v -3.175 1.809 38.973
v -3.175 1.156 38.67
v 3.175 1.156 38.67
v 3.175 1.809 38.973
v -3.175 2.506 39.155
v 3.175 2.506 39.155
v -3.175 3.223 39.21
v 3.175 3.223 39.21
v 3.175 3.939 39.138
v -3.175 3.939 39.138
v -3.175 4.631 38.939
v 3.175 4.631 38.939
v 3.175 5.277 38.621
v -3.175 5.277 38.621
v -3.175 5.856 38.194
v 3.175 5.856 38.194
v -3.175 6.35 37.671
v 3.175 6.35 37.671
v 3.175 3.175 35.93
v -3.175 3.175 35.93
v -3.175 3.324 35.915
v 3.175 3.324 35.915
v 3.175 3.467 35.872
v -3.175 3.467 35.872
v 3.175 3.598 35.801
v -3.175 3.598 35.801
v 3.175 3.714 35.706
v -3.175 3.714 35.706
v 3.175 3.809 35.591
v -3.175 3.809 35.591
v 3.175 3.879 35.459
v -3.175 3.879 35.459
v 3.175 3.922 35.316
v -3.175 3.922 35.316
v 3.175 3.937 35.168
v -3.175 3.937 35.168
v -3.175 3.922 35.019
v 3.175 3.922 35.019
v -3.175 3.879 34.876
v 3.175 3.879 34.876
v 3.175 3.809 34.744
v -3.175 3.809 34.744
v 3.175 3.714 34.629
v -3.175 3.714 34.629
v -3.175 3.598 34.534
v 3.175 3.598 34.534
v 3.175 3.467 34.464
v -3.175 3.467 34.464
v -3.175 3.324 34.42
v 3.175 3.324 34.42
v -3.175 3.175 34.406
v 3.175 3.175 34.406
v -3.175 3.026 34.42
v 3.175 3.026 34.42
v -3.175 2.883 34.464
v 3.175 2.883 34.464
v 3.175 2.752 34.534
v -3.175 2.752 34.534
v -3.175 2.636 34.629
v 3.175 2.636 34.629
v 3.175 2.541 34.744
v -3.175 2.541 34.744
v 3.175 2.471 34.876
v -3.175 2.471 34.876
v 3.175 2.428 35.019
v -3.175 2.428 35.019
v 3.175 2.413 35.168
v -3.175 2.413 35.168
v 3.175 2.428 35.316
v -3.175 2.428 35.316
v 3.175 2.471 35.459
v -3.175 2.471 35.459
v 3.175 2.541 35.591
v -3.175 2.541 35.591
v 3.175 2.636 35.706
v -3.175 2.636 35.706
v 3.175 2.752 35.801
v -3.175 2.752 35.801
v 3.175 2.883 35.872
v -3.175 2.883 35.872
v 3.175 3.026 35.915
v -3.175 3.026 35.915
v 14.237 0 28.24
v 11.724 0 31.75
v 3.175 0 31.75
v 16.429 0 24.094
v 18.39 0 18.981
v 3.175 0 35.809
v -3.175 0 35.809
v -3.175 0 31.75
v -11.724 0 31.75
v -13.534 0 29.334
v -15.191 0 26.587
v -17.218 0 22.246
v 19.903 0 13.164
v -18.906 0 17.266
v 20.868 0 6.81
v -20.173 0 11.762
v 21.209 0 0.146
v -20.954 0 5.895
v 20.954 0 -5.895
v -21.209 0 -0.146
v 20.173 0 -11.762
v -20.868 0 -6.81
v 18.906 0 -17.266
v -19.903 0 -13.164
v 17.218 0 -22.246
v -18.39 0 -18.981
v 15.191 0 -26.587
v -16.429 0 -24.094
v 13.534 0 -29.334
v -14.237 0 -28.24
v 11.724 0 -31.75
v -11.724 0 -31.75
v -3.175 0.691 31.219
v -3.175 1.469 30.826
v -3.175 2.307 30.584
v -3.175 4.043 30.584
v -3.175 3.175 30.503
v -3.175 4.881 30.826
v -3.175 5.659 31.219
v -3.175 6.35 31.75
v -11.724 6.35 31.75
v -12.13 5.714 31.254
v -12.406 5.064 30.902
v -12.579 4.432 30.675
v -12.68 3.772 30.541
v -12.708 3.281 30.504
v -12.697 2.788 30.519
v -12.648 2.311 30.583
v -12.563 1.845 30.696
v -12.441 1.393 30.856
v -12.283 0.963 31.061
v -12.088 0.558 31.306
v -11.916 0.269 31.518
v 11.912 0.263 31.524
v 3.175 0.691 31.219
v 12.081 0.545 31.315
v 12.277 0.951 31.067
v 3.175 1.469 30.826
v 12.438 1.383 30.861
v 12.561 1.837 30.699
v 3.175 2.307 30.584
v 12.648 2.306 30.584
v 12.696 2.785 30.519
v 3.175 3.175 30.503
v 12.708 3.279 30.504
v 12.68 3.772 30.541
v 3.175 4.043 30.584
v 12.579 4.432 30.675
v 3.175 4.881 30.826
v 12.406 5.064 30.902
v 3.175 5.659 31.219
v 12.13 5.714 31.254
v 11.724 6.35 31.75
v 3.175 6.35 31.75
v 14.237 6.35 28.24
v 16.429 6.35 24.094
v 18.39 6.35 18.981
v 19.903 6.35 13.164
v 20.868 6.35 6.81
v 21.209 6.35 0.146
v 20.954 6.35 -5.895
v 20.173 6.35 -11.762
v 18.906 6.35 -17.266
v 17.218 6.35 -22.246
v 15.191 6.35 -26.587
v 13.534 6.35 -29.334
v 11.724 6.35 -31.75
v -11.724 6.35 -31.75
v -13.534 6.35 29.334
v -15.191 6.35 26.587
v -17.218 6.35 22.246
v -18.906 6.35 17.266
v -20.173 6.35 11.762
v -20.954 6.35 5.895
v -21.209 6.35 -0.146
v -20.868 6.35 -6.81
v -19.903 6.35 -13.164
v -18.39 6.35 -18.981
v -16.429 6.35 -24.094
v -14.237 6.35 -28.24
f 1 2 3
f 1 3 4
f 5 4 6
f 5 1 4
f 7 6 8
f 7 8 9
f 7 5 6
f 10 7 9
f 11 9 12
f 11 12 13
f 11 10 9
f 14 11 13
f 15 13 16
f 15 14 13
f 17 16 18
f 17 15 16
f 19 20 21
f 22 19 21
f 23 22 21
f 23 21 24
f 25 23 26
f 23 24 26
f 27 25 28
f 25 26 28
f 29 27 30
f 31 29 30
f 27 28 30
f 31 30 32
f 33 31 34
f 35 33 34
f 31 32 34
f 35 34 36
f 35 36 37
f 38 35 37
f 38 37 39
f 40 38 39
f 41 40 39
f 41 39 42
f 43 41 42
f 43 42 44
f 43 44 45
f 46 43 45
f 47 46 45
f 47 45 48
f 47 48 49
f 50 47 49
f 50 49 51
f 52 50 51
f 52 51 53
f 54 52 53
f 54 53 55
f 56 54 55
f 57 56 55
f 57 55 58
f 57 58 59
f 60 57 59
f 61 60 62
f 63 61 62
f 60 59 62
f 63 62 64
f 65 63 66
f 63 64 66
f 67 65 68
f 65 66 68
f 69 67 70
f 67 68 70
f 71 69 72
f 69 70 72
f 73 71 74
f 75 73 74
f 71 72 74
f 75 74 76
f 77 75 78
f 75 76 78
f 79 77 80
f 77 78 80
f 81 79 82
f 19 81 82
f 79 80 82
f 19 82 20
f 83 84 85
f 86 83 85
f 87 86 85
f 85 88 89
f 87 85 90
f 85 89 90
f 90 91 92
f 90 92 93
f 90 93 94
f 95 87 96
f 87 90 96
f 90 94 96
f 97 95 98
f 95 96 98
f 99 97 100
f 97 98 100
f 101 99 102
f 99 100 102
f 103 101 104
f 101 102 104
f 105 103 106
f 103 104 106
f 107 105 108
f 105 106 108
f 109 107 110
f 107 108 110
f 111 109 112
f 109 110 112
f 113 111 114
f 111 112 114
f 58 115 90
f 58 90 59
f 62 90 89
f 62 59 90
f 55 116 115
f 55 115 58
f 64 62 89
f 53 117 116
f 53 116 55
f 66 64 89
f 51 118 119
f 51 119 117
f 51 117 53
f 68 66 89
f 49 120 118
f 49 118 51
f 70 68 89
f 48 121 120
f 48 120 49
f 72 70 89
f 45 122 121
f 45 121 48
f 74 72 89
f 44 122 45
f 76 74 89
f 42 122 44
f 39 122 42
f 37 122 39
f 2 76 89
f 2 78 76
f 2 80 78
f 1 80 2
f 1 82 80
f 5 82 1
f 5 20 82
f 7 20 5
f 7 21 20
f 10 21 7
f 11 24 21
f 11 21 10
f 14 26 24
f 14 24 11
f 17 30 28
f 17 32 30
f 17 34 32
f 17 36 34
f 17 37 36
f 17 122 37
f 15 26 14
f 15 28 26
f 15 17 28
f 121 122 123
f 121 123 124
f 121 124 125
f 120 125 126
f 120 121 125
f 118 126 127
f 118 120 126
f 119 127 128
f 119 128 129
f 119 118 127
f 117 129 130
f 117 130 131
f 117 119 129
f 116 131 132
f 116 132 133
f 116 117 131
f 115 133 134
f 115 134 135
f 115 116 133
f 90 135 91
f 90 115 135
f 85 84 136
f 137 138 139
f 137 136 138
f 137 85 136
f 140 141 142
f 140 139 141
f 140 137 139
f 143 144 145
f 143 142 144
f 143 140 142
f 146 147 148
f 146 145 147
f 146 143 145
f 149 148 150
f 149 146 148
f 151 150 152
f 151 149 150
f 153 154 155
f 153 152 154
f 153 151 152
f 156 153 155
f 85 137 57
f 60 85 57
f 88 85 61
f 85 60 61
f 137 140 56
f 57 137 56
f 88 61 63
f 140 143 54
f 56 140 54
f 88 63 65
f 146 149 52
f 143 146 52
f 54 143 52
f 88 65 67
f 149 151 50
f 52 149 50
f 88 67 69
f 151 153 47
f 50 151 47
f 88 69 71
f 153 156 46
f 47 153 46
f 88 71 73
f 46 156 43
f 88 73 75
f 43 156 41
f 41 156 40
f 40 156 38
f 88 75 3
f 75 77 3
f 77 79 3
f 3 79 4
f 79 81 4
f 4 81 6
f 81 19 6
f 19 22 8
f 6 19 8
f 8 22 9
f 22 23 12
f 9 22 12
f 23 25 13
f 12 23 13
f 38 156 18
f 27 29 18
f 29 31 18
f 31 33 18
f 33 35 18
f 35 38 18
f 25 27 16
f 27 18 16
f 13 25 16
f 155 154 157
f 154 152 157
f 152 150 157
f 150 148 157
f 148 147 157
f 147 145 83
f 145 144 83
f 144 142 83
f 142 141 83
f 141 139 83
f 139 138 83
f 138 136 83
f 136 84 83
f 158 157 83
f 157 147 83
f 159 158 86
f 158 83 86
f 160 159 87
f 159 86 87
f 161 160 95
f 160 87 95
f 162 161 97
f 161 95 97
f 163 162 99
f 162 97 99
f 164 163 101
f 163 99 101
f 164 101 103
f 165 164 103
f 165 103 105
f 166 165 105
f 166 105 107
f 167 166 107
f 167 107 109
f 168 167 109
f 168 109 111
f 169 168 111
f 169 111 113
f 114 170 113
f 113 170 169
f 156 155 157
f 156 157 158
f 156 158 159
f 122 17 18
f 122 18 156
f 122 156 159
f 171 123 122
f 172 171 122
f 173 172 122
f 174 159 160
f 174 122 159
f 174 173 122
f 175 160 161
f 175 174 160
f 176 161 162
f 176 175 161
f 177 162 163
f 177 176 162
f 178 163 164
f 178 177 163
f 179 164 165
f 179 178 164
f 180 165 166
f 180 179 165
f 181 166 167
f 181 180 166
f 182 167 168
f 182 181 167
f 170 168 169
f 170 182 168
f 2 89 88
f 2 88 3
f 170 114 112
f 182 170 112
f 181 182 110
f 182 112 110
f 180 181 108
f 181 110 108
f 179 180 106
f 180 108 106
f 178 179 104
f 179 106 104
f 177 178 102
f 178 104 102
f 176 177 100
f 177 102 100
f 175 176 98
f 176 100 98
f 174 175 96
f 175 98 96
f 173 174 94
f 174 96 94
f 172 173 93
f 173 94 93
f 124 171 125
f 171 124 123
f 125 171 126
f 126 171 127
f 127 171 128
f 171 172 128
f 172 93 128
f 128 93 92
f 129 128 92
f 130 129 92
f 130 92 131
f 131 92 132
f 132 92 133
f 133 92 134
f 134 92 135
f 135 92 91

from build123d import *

# Parameters (mm, degrees)
SKETCH1_RX               = 38.1
SKETCH1_RY               = 21.209
BOSS_EXTRUDE1_DEPTH      = 6.35
CUT_EXTRUDE6_DEPTH       = 45.065339906
SKETCH35_W               = 18.034
SKETCH35_H               = 6.35
CUT_EXTRUDE17_DEPTH      = 45.065339906
SKETCH36_R               = 0.762
CUT_EXTRUDE18_DEPTH      = 46.678353405
SKETCH37_R               = 4.664778091
CUT_EXTRUDE19_DEPTH      = 46.678353405
SKETCH38_R               = 4.664778091
CUT_EXTRUDE20_DEPTH      = 46.678353405
CUT_EXTRUDE21_DEPTH      = 46.678353405
CUT_EXTRUDE21_DEPTH_BACK = 46.678353405
SKETCH39_W               = 2.364149351
SKETCH39_H               = 6.35
BOSS_EXTRUDE2_DEPTH      = 6.35
CUT_EXTRUDE22_DEPTH      = 46.029039702
CUT_EXTRUDE22_DEPTH_BACK = 46.029039702


with BuildPart() as part:
    # Sketch1 → Boss-Extrude1 (new body)
    with BuildSketch(Plane(origin=(0, 0, 0), x_dir=(1, 0, 0), z_dir=(0, 1, 0))):
        with Locations(Location((0, 0), (0, 0, 90))):
            Ellipse(SKETCH1_RX, SKETCH1_RY)
    extrude(amount=BOSS_EXTRUDE1_DEPTH)

    # Sketch7 → Cut-Extrude6 (cut, through all)
    with BuildSketch(Plane(origin=(0, 6.35, 0), x_dir=(1, 0, 0), z_dir=(0, 1, 0))):
        with BuildLine():
            Line((-11.723715863, 31.75), (11.723715863, 31.75))
            add(Edge.make_bspline(
                [(11.723715863, 31.75), (0, 45.72), (-11.723715863, 31.75)],
                knots=[5.697499764, 5.697499764, 5.697499764, 6.868870851, 6.868870851, 6.868870851], degree=2, weights=[1, 0.833333333, 1]))
        make_face()
    extrude(amount=-CUT_EXTRUDE6_DEPTH, mode=Mode.SUBTRACT)

    # Sketch35 → Cut-Extrude17 (cut, through all)
    with BuildSketch(Plane(origin=(0, 6.35, 0), x_dir=(1, 0, 0), z_dir=(0, 1, 0))):
        with Locations((12.192, -34.925)):
            Rectangle(SKETCH35_W, SKETCH35_H)
        with Locations((-12.192, -34.925)):
            Rectangle(SKETCH35_W, SKETCH35_H)
    extrude(amount=-CUT_EXTRUDE17_DEPTH, mode=Mode.SUBTRACT)

    # Sketch36 → Cut-Extrude18 (cut, through all)
    with BuildSketch(Plane.ZY.offset(3.175)):
        with Locations((35.167532682, 3.175)):
            Circle(SKETCH36_R)
    extrude(amount=-CUT_EXTRUDE18_DEPTH, mode=Mode.SUBTRACT)

    # Sketch37 → Cut-Extrude19 (cut, through all)
    with BuildSketch(Plane.ZY.offset(3.175)):
        with Locations((35.167532682, 3.175)):
            Circle(SKETCH37_R)
    extrude(amount=CUT_EXTRUDE19_DEPTH, mode=Mode.SUBTRACT)

    # Sketch38 → Cut-Extrude20 (cut, through all)
    with BuildSketch(Plane(origin=(3.175, 0, 0), x_dir=(0, 0, -1), z_dir=(1, 0, 0))):
        with Locations((-35.167532682, 3.175)):
            Circle(SKETCH38_R)
    extrude(amount=CUT_EXTRUDE20_DEPTH, mode=Mode.SUBTRACT)

    # Sketch39 → Cut-Extrude21 (cut, two sides: drawn at the far end of the back side and taken through both)
    with BuildSketch(Plane.ZY.offset(3.175).offset(-CUT_EXTRUDE21_DEPTH_BACK)):
        with Locations((38.852740041, 3.175)):
            Rectangle(SKETCH39_W, SKETCH39_H)
    extrude(amount=CUT_EXTRUDE21_DEPTH + CUT_EXTRUDE21_DEPTH_BACK, mode=Mode.SUBTRACT)

    # Sketch40 → Boss-Extrude2 (add)
    with BuildSketch(Plane.ZY.offset(3.175)):
        with BuildLine():
            Line((37.670665365, 6.35), (37.670665365, 0))
            ThreePointArc((37.670665365, 0), (39.210588238, 3.175), (37.670665365, 6.35))
        make_face()
    extrude(amount=-BOSS_EXTRUDE2_DEPTH)

    # Sketch41 → Cut-Extrude22 (cut, two sides: drawn at the far end of the back side and taken through both)
    with BuildSketch(Plane(origin=(0, 0, 0), x_dir=(0, 0, -1), z_dir=(1, 0, 0)).offset(-CUT_EXTRUDE22_DEPTH_BACK)):
        Polygon((-35.808924316, 0), (-40.546826373, 1.914236687), (-40.546826373, -0.644343838), (-35.808924316, -0.644343838), align=None)
    extrude(amount=CUT_EXTRUDE22_DEPTH + CUT_EXTRUDE22_DEPTH_BACK, mode=Mode.SUBTRACT)


solid = part.part
